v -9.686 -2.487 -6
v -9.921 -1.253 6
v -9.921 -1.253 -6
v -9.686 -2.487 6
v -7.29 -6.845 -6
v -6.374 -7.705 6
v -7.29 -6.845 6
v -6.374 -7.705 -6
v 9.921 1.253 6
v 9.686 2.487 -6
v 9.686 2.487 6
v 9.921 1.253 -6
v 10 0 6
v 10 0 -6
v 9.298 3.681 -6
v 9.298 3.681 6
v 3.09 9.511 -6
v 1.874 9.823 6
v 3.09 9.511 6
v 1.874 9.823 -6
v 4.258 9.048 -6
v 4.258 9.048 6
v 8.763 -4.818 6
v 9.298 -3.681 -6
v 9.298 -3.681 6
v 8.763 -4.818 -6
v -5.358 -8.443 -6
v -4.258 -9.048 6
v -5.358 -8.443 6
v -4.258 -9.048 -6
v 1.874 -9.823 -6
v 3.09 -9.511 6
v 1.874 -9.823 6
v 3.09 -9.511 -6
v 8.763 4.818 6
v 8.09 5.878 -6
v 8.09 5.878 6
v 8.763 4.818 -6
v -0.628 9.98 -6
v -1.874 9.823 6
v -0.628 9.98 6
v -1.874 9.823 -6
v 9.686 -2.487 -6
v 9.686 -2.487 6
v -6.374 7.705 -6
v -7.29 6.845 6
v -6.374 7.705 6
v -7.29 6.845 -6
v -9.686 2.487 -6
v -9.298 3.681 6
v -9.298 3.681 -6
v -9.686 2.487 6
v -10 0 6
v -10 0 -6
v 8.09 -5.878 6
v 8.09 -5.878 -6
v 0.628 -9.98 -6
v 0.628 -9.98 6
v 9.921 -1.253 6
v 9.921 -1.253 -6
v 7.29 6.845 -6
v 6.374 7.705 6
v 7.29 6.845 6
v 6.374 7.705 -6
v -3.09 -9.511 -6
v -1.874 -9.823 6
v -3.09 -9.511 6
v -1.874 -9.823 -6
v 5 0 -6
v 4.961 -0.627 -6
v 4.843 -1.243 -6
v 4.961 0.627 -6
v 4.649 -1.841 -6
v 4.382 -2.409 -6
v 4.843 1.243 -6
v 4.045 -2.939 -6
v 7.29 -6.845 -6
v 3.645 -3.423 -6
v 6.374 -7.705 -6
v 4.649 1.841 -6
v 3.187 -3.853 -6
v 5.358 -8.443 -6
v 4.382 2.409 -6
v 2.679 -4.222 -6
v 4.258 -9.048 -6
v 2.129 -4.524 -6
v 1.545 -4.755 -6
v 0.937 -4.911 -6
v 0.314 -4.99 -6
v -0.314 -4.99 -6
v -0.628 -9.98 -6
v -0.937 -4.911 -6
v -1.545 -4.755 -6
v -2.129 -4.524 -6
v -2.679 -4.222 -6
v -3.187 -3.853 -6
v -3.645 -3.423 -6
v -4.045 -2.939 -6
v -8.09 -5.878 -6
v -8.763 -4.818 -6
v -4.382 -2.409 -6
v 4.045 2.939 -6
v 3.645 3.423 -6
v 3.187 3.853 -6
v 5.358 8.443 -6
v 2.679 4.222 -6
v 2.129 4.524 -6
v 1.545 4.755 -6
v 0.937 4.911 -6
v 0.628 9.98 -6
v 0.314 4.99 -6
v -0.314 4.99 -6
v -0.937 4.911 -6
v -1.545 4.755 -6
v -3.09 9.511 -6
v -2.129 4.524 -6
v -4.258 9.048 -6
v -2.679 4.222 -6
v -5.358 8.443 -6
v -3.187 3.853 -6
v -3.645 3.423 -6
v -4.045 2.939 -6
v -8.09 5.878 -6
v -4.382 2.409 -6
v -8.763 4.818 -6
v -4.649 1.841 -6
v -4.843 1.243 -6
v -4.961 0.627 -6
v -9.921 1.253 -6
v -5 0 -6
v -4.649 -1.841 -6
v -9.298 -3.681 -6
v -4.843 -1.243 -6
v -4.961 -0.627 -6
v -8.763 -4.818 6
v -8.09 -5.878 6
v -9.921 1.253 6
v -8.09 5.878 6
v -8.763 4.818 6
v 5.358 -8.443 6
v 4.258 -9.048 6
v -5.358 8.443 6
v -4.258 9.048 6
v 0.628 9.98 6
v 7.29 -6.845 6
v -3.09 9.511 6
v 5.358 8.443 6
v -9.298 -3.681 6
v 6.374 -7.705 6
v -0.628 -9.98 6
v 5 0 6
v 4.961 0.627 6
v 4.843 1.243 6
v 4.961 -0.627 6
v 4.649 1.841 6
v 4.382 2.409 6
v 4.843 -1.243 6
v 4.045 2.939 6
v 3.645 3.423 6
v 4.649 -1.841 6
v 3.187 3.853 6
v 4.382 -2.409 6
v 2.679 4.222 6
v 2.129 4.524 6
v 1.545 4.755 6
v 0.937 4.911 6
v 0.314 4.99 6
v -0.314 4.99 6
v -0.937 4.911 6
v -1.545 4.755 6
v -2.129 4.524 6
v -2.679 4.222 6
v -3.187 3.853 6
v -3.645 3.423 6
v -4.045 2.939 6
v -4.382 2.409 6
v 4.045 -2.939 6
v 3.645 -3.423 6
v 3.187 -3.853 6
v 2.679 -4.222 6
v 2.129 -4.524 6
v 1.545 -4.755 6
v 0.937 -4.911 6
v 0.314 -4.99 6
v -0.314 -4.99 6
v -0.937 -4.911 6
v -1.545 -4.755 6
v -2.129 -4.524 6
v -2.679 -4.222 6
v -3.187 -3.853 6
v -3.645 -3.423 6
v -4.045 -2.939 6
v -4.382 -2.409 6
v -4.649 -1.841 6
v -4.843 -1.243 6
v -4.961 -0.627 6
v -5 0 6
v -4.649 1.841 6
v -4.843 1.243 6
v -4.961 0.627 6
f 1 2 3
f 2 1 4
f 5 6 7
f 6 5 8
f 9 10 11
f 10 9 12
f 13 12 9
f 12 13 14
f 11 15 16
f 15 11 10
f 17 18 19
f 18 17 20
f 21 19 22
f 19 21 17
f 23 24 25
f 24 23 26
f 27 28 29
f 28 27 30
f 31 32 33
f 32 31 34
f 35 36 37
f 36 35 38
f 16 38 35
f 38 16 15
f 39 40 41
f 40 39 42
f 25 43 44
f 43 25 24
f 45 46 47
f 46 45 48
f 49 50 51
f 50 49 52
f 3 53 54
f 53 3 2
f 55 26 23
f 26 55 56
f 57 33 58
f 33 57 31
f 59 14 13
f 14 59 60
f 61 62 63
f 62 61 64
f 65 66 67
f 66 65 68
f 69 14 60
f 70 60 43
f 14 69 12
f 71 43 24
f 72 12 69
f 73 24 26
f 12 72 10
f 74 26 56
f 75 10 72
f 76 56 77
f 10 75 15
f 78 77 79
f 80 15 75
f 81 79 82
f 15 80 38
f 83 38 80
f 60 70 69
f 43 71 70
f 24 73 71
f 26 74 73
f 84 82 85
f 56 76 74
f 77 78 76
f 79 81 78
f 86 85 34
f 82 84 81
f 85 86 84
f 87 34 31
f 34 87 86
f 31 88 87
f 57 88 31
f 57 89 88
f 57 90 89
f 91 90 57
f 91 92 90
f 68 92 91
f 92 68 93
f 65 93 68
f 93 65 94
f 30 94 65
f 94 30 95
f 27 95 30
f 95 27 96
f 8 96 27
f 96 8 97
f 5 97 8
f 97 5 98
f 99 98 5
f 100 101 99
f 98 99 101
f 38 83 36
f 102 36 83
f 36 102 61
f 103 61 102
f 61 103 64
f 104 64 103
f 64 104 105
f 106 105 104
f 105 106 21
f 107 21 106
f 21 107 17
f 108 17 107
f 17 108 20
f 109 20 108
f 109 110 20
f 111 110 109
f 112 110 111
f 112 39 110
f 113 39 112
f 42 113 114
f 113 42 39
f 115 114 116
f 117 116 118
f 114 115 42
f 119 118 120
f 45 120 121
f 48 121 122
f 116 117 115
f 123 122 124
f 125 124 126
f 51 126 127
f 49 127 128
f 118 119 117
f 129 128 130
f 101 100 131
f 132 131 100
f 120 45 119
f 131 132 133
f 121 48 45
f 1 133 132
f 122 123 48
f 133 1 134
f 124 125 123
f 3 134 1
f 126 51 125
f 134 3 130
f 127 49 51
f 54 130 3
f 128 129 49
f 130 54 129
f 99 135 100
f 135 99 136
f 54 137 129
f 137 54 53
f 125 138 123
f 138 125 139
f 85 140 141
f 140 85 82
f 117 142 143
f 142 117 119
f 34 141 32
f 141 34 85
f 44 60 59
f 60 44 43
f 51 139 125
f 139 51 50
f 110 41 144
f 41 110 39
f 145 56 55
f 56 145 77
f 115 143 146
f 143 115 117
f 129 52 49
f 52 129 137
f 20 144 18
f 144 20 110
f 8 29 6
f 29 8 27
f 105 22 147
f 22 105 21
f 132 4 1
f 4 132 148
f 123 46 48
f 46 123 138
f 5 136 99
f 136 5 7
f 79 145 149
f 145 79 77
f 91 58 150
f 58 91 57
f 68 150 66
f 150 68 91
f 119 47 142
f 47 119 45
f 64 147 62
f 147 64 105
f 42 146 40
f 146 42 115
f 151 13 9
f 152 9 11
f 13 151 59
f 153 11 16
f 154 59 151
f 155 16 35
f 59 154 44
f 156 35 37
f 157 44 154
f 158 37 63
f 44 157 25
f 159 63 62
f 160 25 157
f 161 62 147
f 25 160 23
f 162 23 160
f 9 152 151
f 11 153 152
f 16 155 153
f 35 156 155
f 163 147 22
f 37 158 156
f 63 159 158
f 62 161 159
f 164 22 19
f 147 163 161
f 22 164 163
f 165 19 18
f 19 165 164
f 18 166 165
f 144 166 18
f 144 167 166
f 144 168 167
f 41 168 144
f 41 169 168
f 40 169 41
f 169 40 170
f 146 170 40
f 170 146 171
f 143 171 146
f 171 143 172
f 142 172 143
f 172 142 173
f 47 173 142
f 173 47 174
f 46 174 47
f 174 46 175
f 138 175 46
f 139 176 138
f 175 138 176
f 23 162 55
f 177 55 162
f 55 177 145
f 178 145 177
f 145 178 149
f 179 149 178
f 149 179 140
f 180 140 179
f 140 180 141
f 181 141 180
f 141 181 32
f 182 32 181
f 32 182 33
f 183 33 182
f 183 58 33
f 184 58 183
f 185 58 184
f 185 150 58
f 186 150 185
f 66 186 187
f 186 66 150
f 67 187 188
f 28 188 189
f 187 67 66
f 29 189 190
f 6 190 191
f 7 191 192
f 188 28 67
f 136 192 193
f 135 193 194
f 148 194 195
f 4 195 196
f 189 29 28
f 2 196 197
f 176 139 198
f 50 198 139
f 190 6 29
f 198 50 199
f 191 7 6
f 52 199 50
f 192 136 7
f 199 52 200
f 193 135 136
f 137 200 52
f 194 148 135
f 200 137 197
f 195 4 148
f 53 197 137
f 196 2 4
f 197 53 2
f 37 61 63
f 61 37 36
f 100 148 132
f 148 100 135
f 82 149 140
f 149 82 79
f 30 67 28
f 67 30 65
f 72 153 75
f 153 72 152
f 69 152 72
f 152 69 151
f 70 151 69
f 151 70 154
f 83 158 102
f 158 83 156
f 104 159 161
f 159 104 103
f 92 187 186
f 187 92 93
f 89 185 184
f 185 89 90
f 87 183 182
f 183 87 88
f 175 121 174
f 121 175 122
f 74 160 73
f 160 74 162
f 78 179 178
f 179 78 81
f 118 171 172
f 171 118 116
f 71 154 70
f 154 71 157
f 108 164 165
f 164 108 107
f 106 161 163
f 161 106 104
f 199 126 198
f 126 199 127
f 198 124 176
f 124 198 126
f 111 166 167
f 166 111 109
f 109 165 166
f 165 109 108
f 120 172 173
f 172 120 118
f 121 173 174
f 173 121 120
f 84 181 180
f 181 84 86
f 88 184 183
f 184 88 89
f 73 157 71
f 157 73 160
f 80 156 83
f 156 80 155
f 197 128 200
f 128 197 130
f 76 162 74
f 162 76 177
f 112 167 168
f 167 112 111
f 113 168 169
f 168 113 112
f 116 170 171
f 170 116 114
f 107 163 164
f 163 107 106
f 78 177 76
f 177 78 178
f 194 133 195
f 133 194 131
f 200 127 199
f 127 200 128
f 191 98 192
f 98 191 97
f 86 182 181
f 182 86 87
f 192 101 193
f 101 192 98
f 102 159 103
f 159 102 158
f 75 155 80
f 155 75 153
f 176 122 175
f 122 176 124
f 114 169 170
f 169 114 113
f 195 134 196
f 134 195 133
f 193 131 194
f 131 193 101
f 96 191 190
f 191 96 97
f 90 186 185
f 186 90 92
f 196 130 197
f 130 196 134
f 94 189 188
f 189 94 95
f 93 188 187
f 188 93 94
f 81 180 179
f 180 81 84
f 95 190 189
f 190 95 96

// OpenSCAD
$fn = 50;


difference() {
	union() {
		translate(v = [0, 0, -6.0000000000]) {
			cylinder(h = 12, r = 10.0000000000);
		}
	}
	union() {
		translate(v = [0, 0, -100.0000000000]) {
			cylinder(h = 200, r = 5.0000000000);
		}
	}
}
